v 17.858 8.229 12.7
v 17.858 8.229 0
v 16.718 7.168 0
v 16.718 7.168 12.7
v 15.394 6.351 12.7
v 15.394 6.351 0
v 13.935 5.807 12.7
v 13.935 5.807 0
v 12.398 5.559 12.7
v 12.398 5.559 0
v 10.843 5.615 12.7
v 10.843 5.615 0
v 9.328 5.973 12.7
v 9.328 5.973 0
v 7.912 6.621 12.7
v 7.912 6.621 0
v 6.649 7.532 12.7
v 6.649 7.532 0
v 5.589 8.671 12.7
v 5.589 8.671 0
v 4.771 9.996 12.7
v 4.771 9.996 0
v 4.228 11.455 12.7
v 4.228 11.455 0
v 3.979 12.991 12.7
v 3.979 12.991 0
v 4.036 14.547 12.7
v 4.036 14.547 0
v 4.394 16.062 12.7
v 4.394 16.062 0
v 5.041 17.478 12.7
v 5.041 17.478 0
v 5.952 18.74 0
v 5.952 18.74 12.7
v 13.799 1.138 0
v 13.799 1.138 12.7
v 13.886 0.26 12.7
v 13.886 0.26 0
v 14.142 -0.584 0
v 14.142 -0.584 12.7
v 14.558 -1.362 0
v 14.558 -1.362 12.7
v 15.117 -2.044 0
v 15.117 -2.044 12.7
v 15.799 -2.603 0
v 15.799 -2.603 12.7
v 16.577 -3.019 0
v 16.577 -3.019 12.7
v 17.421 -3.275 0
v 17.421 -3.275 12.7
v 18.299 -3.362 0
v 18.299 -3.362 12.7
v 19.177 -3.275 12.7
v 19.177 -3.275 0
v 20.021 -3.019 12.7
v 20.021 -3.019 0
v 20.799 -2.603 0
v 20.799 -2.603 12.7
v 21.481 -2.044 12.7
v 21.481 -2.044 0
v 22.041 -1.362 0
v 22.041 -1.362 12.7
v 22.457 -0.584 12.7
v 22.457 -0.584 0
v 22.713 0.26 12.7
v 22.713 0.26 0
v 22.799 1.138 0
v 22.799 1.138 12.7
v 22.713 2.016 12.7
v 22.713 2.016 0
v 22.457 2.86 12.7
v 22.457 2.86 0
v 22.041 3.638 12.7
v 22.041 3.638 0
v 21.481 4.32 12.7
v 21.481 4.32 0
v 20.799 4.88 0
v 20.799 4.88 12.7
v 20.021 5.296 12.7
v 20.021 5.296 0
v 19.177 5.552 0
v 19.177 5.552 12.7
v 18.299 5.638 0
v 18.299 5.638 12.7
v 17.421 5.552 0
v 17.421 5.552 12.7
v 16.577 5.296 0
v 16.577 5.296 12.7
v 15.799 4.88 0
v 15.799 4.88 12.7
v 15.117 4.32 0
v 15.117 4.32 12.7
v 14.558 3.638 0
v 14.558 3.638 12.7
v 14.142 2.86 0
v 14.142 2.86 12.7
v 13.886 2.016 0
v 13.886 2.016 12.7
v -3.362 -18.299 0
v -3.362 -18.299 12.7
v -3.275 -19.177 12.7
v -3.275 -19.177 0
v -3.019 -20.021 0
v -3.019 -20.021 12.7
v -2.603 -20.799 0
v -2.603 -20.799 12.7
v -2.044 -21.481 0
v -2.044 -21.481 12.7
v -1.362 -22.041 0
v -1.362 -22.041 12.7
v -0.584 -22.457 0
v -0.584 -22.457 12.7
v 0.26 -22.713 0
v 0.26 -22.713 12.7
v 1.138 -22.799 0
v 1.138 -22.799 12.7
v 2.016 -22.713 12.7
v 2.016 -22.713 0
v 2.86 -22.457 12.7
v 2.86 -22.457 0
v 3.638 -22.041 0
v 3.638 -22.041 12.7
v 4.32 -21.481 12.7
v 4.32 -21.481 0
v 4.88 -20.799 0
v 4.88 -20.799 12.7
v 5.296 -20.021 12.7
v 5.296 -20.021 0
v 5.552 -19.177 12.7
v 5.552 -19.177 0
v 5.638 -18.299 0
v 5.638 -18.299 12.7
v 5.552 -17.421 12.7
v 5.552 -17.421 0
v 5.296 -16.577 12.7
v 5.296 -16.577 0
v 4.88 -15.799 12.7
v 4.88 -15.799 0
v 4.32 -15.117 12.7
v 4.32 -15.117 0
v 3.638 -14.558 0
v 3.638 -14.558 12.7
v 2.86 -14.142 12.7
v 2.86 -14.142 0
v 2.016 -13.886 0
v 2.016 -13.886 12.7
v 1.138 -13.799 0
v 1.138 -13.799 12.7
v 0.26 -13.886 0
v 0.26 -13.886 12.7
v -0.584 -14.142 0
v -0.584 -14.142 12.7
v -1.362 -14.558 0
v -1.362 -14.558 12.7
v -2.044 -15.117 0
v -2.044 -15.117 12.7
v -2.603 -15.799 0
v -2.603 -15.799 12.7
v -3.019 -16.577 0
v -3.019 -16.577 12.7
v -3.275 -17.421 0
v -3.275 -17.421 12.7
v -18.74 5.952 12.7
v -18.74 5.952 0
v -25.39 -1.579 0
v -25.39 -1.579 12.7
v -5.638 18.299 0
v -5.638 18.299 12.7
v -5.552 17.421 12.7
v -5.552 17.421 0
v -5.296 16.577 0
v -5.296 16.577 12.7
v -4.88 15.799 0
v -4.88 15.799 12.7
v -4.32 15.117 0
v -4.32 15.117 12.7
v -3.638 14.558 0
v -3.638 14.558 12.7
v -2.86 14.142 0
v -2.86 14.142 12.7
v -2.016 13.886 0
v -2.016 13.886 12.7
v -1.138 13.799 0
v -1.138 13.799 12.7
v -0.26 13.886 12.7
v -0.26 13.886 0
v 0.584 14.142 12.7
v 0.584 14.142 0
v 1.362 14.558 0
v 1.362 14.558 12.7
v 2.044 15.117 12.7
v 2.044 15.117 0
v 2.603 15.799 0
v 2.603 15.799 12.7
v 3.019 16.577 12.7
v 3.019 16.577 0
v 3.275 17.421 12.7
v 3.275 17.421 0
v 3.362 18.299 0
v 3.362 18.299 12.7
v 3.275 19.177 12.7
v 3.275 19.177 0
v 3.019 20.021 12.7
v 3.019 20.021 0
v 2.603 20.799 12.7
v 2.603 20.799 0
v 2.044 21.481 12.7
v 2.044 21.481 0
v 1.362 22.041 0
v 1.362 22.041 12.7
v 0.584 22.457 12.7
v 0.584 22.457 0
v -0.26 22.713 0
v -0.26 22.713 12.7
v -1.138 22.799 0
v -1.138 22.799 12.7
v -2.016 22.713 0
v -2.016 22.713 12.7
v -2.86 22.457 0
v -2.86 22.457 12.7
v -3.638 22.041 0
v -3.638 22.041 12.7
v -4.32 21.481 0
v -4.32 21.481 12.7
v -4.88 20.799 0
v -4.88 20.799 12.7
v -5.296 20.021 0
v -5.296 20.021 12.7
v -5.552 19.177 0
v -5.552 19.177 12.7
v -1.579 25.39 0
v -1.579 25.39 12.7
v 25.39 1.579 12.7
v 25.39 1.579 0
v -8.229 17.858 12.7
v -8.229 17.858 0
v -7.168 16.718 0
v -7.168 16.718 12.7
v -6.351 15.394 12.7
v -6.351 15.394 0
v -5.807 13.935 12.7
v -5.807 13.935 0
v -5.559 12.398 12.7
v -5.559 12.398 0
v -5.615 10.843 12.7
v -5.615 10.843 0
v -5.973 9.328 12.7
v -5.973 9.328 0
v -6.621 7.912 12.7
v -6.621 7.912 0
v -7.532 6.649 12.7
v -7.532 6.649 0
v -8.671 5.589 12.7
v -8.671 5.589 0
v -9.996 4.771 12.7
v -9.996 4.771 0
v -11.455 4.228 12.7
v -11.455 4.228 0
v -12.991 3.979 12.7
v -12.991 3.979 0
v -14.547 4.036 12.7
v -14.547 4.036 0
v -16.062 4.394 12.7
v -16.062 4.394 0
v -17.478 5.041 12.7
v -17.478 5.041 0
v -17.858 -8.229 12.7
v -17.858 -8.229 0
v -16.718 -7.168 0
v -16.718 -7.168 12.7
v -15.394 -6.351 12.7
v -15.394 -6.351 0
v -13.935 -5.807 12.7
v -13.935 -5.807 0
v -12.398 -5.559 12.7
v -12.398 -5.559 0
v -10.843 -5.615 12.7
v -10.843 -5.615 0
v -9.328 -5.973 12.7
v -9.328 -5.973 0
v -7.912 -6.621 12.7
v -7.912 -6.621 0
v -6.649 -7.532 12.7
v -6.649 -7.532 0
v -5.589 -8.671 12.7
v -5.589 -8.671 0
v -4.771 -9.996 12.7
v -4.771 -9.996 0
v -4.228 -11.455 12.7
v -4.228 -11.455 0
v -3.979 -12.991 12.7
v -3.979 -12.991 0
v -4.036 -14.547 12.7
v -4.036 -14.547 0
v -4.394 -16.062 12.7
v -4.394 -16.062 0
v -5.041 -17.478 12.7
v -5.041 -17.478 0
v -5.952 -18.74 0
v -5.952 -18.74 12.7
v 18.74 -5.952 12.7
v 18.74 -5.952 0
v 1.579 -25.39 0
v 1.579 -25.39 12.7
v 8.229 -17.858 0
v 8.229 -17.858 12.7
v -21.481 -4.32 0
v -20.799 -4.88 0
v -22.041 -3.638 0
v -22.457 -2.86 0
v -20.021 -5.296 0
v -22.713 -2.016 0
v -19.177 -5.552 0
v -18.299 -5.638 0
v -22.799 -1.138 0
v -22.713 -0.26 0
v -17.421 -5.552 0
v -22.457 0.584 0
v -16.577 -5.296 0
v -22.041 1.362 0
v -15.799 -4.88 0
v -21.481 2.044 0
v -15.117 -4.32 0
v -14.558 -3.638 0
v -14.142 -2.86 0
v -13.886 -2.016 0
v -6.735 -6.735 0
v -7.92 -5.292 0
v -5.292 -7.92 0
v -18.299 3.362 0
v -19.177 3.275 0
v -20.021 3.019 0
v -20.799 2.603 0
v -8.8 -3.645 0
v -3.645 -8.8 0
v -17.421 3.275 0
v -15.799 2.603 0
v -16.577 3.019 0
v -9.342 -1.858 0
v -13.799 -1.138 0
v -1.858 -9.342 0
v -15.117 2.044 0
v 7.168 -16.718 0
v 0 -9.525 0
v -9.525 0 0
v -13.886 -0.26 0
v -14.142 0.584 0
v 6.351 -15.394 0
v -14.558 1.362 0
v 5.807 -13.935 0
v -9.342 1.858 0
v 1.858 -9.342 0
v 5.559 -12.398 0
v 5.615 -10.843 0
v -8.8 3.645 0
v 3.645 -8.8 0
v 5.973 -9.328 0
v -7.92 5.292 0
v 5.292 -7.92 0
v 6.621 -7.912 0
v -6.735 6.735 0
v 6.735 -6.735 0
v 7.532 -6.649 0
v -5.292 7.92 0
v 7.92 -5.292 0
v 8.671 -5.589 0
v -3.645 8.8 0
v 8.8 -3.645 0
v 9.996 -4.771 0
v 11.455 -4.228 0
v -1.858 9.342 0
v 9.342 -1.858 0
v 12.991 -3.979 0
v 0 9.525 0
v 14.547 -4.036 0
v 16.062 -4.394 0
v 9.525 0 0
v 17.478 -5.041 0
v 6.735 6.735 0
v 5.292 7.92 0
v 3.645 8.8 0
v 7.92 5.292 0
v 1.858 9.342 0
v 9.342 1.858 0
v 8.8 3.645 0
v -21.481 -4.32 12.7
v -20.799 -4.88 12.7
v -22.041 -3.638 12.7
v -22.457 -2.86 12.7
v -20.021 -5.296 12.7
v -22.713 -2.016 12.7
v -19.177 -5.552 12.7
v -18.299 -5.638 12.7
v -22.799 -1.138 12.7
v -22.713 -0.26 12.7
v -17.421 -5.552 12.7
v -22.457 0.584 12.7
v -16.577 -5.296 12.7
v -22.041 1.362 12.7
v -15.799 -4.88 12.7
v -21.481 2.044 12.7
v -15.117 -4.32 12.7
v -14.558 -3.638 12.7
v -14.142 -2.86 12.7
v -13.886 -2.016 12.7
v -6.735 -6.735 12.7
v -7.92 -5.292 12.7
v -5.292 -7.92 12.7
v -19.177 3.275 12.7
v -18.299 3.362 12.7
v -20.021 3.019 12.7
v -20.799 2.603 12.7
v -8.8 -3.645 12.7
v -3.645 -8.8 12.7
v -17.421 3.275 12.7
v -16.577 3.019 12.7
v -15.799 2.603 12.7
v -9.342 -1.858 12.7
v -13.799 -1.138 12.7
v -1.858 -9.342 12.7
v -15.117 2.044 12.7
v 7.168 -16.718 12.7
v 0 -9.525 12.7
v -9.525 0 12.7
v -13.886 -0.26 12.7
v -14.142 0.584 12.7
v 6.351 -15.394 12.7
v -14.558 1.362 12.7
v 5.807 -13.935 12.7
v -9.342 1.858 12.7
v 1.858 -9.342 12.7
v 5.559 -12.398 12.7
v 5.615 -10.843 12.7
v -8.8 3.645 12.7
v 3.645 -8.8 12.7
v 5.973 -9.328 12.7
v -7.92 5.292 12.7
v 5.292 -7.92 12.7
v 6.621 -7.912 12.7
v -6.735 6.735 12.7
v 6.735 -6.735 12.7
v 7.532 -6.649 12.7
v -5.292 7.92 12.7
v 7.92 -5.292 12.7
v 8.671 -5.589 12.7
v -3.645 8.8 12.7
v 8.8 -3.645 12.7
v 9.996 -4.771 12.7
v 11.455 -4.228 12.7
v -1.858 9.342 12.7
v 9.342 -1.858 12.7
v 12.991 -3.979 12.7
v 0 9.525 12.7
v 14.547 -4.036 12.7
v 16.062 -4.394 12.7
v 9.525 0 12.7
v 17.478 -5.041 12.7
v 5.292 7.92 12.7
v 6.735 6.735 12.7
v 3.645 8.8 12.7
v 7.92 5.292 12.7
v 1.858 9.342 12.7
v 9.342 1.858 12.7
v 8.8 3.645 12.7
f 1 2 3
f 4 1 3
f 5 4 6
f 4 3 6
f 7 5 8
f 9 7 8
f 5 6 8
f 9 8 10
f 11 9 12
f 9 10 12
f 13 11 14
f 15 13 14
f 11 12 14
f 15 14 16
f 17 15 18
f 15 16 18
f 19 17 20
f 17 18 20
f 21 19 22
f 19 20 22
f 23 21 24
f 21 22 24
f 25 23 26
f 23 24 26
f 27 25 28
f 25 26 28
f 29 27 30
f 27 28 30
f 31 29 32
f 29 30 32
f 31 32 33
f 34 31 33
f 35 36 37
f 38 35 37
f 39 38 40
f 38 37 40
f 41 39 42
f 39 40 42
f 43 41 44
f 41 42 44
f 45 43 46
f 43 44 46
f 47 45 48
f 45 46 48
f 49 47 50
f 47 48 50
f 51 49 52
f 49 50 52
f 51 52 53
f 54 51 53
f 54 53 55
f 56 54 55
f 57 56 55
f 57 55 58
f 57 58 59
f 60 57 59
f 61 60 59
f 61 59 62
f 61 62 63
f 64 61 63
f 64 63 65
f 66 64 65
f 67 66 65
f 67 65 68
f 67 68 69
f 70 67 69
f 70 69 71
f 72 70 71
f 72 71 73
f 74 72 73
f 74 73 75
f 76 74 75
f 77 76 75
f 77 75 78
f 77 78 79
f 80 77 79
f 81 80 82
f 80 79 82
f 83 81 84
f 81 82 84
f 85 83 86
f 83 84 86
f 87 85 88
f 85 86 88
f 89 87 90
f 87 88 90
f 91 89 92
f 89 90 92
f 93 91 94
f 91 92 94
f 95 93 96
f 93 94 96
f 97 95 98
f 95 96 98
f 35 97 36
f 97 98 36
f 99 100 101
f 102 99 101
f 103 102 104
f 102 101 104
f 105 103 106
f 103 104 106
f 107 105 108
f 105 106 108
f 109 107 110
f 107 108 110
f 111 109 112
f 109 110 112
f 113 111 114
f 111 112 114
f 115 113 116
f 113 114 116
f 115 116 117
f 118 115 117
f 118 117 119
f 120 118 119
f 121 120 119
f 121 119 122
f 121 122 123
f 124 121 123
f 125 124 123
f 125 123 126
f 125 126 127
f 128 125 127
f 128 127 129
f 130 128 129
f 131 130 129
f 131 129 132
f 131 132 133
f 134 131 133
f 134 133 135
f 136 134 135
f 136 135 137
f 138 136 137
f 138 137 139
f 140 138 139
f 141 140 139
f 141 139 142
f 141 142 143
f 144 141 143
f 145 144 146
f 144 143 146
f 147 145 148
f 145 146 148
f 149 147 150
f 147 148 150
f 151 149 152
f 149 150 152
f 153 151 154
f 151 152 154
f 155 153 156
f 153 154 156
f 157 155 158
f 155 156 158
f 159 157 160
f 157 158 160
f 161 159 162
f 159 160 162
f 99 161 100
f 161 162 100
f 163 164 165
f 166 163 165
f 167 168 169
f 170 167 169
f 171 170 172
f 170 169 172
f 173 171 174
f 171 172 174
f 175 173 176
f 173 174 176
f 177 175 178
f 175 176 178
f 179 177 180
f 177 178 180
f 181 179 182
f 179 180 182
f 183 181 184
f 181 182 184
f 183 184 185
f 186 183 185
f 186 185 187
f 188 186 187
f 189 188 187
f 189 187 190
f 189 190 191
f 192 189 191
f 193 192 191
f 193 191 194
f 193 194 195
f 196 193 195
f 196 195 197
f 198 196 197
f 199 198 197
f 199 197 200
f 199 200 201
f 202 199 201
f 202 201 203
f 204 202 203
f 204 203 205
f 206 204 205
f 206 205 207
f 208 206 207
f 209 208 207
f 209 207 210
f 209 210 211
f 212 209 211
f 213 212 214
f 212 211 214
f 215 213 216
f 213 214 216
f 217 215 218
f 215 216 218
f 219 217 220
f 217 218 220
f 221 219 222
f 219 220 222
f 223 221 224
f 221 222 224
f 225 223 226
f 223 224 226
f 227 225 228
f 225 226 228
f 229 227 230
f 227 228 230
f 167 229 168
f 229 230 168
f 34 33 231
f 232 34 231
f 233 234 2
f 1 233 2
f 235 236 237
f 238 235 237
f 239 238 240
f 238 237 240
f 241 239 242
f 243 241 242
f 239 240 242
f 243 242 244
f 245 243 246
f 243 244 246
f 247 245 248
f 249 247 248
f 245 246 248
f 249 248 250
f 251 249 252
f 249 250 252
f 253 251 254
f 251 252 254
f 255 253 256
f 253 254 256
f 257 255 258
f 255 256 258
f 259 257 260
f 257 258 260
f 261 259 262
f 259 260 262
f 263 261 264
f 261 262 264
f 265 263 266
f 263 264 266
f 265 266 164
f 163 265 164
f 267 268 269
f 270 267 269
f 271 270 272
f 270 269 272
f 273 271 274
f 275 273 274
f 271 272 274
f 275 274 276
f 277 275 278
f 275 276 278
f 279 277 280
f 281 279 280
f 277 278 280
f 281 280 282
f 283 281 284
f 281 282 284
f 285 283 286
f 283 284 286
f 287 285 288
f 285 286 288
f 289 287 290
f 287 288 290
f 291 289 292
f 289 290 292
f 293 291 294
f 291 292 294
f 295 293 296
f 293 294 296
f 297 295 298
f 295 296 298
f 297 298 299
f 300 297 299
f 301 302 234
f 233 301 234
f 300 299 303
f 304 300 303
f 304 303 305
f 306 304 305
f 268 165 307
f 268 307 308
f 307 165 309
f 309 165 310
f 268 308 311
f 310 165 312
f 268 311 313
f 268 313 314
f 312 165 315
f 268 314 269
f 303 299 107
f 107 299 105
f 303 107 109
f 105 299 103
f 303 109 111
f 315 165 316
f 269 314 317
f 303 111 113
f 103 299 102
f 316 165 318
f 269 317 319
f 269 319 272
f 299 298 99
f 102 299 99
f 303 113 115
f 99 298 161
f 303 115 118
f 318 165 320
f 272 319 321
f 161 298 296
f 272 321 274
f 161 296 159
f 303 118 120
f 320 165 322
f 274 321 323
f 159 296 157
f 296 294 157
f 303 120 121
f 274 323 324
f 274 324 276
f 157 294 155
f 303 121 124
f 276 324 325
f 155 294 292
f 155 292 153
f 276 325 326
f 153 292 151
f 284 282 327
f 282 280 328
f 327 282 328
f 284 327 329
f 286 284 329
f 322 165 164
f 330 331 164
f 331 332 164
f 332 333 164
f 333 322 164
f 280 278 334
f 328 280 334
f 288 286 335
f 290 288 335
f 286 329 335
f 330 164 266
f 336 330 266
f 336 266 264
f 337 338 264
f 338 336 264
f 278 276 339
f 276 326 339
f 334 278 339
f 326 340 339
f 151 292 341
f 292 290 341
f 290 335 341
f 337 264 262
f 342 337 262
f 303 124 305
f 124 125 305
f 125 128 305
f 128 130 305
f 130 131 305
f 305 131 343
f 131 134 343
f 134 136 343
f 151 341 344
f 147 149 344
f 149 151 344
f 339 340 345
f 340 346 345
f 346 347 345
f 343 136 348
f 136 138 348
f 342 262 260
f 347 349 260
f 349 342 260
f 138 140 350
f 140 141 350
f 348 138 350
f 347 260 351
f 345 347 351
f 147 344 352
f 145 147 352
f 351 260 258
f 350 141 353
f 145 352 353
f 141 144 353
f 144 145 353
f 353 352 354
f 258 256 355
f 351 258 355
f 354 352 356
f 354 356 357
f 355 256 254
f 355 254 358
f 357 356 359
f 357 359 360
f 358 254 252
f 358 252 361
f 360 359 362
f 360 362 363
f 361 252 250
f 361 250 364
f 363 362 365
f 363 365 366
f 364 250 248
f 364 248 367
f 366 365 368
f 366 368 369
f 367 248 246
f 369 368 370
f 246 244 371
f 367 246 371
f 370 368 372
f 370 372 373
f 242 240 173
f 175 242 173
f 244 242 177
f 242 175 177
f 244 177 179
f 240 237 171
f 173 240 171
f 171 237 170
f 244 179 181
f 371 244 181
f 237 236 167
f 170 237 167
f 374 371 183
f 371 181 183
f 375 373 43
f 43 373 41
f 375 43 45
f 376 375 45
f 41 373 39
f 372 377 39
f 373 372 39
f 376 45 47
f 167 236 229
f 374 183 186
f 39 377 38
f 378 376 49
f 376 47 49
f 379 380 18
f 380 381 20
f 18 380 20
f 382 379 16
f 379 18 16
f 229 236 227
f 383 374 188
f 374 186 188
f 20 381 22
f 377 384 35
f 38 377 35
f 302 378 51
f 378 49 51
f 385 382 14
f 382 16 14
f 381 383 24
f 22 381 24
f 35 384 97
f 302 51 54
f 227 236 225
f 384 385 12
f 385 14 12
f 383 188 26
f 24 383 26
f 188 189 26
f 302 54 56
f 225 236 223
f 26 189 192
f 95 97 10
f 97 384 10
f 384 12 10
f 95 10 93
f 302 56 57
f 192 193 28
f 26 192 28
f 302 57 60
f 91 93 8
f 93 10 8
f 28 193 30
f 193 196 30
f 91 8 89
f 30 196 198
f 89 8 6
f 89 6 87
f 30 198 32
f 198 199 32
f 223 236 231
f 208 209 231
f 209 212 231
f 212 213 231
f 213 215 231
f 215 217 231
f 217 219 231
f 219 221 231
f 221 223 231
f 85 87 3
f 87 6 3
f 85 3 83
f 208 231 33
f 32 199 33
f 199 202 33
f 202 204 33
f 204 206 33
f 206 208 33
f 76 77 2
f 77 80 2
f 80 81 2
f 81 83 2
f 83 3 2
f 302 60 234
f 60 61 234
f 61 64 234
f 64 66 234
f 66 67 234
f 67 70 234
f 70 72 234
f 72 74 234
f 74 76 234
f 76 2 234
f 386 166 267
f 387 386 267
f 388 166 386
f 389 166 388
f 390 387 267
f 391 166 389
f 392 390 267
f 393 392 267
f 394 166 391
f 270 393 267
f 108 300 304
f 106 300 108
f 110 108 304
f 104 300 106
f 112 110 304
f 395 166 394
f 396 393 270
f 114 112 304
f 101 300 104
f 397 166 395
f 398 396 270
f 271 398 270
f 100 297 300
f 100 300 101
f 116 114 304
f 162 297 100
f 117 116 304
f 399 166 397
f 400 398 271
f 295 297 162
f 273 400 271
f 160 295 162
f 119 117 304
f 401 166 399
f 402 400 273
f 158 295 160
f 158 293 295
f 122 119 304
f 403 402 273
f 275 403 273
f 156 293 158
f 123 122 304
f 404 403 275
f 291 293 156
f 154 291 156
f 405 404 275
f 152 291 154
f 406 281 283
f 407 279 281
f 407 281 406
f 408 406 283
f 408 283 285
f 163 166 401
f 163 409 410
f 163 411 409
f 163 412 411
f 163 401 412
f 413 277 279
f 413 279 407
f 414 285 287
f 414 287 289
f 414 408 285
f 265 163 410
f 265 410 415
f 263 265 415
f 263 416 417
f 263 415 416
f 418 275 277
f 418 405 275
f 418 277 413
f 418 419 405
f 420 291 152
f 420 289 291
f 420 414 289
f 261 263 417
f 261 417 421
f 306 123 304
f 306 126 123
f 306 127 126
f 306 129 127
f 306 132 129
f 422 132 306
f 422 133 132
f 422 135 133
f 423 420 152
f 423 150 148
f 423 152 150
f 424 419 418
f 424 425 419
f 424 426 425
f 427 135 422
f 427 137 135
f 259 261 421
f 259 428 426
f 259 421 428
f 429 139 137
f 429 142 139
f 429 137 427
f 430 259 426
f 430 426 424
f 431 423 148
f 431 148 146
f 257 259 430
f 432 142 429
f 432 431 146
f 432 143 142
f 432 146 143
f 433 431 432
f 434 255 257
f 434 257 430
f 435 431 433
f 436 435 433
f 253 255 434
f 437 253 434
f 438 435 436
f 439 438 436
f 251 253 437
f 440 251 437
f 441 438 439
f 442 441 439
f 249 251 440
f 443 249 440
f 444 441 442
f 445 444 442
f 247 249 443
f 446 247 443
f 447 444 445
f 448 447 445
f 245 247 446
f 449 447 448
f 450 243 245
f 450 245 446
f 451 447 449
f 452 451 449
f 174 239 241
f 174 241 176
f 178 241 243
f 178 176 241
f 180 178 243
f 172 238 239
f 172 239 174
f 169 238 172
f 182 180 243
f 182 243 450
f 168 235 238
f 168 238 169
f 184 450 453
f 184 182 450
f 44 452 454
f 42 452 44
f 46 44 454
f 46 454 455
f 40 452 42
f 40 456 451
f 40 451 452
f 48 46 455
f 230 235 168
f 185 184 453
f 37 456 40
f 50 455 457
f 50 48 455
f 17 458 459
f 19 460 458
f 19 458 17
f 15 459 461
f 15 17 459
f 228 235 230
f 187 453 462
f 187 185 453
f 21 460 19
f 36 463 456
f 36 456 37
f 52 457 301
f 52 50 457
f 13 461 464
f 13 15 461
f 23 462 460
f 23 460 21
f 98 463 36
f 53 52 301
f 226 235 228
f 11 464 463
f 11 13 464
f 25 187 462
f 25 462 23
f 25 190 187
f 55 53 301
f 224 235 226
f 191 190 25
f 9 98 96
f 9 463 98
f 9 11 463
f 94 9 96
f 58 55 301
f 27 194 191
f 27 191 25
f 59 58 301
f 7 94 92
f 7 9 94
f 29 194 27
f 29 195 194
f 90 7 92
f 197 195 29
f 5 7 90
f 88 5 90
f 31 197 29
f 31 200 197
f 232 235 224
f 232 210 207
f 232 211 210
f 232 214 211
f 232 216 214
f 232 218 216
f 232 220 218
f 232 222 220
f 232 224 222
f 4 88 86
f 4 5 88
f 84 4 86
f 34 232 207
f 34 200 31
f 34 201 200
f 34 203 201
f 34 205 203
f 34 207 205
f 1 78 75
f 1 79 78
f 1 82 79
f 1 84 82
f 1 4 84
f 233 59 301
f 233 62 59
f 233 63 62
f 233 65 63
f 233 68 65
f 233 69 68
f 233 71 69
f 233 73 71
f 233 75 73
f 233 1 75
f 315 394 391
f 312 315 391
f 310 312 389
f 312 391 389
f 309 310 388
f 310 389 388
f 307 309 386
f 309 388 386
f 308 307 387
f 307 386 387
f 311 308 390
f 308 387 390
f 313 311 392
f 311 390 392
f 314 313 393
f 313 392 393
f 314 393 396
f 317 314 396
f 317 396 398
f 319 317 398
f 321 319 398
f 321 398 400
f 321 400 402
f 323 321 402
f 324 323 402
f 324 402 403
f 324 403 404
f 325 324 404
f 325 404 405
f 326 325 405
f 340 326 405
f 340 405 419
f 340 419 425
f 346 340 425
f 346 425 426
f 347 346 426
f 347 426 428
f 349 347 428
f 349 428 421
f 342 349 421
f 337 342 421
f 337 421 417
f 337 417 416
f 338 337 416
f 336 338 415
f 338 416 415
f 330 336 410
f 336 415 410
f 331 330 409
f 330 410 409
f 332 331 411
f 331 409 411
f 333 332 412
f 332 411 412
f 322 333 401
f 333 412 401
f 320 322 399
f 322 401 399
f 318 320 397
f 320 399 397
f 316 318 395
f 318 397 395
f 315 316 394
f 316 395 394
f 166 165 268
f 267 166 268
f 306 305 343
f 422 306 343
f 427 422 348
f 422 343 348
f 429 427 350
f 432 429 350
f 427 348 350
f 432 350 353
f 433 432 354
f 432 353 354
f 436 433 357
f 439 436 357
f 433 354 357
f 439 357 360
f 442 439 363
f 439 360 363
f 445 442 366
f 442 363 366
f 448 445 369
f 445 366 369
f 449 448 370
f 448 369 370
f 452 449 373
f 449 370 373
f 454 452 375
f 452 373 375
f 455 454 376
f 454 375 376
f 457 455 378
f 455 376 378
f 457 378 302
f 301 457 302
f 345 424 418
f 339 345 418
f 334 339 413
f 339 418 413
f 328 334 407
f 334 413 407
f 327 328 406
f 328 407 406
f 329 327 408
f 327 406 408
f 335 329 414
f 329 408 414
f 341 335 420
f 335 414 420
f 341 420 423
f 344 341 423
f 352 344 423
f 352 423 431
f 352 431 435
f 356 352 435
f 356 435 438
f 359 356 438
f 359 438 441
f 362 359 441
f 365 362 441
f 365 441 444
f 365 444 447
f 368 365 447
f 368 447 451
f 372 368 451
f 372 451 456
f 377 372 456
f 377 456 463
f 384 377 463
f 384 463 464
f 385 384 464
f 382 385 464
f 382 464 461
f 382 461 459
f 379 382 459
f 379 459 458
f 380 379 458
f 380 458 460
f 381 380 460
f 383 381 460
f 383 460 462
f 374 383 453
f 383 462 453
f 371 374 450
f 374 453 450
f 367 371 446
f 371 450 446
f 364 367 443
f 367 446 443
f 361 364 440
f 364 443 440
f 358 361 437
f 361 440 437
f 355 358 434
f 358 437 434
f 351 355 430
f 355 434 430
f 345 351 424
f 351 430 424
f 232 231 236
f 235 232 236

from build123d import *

# Parameters (mm, degrees)
F1_DEPTH = 12.7
F2_D     = 19.05
F3_D     = 9


with BuildPart() as f1:
    # F0 (on Top) → F1 (new body)
    with BuildSketch(Plane.XY):
        with BuildLine():
            Line((5.9523138316, 18.7402282516), (-1.5792061086, 25.3897088273))
            Line((-1.5792061086, 25.3897088273), (-8.2286866843, 17.858188887))
            ThreePointArc((-8.2286866843, 17.858188887), (-7.5315199403, 6.6494805757), (-18.7402282516, 5.9523138316))
            Line((-18.7402282516, 5.9523138316), (-25.3897088273, -1.5792061086))
            Line((-25.3897088273, -1.5792061086), (-17.858188887, -8.2286866843))
            ThreePointArc((-17.858188887, -8.2286866843), (-6.6494805757, -7.5315199403), (-5.9523138316, -18.7402282516))
            Line((-5.9523138316, -18.7402282516), (1.5792061086, -25.3897088273))
            Line((1.5792061086, -25.3897088273), (8.2286866843, -17.858188887))
            ThreePointArc((8.2286866843, -17.858188887), (7.5315199403, -6.6494805757), (18.7402282516, -5.9523138316))
            Line((18.7402282516, -5.9523138316), (25.3897088273, 1.5792061086))
            Line((25.3897088273, 1.5792061086), (17.858188887, 8.2286866843))
            ThreePointArc((17.858188887, 8.2286866843), (6.6494805757, 7.5315199403), (5.9523138316, 18.7402282516))
        make_face()
    extrude(amount=F1_DEPTH)

    # F2 (through all)
    with Locations(Plane(origin=(0, 0, 0), x_dir=(1, 0, 0), z_dir=(0, 0, -1))):
        with Locations((0, 0)):
            Hole(F2_D / 2)

    # F3 (through all)
    with Locations(Plane(origin=(0, 0, 0), x_dir=(1, 0, 0), z_dir=(0, 0, -1))):
        with Locations((18.2992085693, -1.1381864263), (-1.1381864263, -18.2992085693), (-18.2992085693, 1.1381864263), (1.1381864263, 18.2992085693)):
            Hole(F3_D / 2)


solid = f1.part
